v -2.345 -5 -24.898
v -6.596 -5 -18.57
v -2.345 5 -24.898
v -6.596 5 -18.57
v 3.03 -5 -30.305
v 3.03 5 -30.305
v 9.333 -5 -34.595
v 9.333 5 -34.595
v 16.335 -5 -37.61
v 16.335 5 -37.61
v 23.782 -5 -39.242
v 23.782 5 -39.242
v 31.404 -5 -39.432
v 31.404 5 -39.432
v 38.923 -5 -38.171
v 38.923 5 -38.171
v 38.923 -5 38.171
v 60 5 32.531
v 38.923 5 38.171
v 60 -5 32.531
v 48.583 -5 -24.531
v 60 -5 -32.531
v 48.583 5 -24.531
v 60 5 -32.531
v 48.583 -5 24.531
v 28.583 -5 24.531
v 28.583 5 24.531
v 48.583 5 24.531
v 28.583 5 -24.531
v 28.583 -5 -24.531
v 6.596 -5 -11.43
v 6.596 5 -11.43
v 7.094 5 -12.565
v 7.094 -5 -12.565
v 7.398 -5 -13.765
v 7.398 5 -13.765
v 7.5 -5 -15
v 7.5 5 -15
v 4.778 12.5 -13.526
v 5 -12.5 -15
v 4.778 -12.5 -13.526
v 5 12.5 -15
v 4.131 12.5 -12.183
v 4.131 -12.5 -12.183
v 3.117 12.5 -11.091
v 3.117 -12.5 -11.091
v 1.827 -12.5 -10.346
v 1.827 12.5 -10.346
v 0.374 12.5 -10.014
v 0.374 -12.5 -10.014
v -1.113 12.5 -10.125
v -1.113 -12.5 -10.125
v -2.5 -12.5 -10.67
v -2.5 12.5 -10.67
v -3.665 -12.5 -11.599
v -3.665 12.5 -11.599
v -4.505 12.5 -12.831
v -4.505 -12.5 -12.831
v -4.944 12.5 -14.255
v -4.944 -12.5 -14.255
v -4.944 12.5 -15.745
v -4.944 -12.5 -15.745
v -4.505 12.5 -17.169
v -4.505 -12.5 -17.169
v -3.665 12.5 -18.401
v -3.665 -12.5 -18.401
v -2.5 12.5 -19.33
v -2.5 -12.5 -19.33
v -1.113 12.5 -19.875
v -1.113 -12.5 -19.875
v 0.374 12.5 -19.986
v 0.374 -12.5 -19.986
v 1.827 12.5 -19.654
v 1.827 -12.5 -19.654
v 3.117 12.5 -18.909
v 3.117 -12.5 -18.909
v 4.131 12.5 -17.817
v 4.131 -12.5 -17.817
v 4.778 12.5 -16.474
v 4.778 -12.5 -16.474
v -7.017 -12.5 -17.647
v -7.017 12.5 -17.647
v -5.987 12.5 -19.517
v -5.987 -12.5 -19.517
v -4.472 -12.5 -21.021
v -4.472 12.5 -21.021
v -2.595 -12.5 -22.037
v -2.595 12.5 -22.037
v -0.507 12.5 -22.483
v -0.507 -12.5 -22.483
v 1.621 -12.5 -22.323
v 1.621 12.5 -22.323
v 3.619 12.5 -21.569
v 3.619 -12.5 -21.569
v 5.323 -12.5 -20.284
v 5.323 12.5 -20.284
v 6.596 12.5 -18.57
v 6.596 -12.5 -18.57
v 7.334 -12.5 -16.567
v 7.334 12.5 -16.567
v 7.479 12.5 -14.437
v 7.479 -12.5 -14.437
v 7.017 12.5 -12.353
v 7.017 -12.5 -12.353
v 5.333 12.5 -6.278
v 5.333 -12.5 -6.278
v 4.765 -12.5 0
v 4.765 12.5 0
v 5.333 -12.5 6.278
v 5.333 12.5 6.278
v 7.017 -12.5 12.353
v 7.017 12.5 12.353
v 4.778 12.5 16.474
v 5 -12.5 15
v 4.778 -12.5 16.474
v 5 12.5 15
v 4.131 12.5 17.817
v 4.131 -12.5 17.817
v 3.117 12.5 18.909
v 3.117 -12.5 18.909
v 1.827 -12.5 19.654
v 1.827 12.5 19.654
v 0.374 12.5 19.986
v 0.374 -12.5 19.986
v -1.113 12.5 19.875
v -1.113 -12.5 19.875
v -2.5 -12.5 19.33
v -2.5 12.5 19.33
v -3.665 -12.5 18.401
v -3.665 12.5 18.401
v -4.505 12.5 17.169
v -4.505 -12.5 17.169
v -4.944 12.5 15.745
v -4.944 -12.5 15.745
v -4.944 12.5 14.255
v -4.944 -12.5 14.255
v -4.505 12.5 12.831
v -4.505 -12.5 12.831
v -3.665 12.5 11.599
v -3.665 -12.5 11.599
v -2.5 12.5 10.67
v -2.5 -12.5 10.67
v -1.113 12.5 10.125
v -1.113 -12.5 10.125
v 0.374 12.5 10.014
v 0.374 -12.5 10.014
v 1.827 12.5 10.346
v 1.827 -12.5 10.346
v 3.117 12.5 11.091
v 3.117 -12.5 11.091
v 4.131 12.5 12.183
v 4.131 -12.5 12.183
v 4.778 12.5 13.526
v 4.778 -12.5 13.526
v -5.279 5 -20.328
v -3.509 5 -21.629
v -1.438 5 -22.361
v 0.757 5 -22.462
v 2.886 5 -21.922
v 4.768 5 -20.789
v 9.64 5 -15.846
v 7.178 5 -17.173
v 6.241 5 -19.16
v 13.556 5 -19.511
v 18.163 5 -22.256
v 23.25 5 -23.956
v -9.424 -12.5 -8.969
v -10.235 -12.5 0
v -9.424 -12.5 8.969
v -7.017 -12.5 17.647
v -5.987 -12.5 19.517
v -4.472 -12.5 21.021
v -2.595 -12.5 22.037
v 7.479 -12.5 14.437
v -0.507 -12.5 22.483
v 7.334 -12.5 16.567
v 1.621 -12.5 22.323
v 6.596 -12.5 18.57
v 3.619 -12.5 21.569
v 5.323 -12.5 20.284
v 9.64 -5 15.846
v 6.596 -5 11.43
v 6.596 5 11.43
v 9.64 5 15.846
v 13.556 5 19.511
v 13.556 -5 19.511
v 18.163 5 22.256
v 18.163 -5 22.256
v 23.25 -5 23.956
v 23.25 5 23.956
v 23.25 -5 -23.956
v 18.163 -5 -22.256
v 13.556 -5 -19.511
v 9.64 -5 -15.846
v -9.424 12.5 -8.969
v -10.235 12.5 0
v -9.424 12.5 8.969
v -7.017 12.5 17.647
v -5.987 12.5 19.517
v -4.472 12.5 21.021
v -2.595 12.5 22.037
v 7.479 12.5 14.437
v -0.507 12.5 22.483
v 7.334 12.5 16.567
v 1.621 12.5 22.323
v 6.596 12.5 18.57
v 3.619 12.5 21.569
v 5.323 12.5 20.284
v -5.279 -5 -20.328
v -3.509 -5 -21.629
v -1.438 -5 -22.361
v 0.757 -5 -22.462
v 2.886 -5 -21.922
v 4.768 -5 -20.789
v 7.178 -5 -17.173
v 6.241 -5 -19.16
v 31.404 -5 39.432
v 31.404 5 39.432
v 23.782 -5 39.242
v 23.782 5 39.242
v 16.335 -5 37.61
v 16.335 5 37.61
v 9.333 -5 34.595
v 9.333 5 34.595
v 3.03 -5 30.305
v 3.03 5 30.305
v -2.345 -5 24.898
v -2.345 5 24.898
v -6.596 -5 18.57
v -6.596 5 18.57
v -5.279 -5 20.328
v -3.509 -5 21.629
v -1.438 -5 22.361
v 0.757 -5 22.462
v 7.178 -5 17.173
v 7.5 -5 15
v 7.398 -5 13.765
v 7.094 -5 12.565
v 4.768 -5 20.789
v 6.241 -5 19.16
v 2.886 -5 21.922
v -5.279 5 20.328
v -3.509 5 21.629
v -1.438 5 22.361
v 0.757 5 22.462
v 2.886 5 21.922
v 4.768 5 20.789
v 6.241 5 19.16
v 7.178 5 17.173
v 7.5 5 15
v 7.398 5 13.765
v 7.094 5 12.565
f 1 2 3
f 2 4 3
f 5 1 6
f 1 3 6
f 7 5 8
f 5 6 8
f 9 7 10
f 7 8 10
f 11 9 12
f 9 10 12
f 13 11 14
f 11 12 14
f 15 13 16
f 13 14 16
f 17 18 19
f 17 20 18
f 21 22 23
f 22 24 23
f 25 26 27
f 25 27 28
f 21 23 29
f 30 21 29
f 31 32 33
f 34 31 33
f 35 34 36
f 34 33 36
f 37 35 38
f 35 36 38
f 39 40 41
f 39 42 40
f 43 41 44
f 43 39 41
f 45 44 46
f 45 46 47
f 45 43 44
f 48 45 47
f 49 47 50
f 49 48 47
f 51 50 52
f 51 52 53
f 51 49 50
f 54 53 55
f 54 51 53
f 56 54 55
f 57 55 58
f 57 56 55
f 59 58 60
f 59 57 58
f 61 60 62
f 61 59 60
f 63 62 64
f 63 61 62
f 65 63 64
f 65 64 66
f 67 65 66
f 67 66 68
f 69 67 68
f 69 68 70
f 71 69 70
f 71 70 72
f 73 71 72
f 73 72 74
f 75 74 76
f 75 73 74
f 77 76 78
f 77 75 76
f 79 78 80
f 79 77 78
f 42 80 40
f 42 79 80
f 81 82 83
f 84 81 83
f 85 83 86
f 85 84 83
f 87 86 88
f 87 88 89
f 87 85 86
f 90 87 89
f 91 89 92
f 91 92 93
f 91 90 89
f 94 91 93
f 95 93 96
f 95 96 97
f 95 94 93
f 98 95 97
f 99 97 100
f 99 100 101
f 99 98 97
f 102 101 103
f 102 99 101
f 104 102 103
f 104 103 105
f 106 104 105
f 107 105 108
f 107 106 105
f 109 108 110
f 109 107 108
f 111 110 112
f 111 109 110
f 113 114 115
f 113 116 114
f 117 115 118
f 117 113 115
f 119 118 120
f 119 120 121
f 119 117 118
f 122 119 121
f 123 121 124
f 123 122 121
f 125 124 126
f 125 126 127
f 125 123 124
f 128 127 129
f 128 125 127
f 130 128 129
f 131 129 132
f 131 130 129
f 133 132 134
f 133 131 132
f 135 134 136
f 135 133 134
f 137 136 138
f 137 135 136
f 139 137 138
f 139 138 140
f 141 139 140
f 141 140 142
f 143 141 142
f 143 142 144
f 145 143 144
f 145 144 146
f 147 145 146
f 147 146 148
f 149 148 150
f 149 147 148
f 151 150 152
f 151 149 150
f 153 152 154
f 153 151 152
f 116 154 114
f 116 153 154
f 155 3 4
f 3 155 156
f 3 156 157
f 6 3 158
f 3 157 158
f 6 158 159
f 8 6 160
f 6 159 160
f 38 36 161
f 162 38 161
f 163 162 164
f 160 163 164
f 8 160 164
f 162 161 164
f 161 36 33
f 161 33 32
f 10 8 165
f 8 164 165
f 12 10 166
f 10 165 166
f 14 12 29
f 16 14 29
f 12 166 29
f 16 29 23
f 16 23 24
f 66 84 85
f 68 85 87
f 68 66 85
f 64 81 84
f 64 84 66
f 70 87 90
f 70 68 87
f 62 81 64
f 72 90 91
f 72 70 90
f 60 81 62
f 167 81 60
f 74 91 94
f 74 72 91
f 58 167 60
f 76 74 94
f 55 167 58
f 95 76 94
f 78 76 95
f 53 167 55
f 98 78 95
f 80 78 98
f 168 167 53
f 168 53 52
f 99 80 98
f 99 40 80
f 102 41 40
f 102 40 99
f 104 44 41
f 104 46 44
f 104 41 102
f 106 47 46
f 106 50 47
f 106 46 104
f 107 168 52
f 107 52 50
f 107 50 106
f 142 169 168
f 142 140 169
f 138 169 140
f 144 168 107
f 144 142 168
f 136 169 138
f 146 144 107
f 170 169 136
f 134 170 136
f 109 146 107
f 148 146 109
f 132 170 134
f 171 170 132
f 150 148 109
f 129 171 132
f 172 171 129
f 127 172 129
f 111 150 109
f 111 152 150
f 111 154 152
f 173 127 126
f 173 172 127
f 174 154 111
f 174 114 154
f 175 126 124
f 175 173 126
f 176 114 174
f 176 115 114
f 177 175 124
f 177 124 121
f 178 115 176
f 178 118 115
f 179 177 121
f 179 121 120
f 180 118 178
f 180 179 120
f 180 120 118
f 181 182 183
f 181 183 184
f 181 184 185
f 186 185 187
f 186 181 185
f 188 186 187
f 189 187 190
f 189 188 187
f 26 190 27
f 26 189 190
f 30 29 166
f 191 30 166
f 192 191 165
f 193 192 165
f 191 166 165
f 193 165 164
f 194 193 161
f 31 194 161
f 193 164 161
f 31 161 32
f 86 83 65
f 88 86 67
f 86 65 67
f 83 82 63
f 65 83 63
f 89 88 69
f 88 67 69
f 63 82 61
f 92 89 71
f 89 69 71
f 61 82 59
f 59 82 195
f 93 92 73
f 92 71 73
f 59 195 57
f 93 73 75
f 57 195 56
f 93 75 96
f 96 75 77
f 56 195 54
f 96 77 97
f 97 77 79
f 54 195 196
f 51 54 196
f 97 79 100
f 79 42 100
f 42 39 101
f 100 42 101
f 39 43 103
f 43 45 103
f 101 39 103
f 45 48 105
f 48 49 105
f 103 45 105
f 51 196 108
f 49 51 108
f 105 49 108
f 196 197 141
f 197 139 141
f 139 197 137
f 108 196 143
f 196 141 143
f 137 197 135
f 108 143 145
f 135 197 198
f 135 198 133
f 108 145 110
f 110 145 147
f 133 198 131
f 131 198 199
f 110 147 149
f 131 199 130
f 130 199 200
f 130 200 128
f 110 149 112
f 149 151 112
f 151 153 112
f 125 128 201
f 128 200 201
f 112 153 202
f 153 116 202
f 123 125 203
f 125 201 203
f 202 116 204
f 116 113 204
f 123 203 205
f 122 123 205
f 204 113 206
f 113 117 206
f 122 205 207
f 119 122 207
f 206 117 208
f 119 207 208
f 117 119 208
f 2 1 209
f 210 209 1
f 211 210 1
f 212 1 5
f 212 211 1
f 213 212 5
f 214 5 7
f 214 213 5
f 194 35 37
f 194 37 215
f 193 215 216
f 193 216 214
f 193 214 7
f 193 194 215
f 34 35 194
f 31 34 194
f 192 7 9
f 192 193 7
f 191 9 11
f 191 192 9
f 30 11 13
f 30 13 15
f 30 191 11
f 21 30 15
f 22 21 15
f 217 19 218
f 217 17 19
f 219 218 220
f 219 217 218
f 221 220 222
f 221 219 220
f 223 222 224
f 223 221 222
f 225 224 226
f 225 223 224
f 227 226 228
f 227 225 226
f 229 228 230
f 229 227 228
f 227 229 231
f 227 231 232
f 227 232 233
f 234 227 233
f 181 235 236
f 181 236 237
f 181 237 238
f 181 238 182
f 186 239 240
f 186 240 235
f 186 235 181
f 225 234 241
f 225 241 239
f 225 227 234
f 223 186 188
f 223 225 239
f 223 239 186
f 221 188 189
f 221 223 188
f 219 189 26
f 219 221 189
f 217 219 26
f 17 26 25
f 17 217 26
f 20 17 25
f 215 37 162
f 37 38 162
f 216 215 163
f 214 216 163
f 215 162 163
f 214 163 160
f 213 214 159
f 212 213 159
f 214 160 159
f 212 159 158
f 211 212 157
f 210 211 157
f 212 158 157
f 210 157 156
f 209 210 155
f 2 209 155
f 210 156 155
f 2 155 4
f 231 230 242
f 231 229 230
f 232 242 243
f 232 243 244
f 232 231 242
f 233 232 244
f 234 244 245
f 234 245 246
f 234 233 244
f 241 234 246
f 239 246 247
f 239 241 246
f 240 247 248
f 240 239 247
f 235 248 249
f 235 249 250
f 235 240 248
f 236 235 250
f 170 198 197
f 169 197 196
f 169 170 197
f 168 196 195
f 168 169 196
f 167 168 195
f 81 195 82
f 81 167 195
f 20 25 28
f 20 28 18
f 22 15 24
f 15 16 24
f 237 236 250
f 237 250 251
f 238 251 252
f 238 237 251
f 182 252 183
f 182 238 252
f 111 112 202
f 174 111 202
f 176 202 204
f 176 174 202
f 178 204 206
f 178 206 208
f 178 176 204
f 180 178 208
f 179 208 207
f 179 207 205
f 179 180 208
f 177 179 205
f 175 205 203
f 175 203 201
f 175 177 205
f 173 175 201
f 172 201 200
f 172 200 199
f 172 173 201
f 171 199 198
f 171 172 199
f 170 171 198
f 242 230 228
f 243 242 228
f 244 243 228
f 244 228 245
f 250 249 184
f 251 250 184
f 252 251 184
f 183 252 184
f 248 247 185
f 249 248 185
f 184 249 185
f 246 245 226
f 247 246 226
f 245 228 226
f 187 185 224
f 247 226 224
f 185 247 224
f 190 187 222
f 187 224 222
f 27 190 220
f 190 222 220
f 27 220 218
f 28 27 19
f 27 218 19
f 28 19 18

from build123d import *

# Parameters (mm, degrees)
F0_R     = 5
F2_DEPTH = 12.5
F3_DEPTH = 5


with BuildPart() as f2:
    # F0 (on Front) → F2 (new body, symmetric)
    with BuildSketch(Plane.XZ):
        with BuildLine():
            ThreePointArc((7.017341, -12.352941), (4.764934, 0), (7.017341, 12.352941))
            ThreePointArc((7.017341, 12.352941), (2.647059, 22.017341), (-7.017341, 17.647059))
            ThreePointArc((-7.017341, 17.647059), (-10.235066, 0), (-7.017341, -17.647059))
            ThreePointArc((-7.017341, -17.647059), (2.647059, -22.017341), (7.017341, -12.352941))
        make_face()
        with Locations((0, -15)):
            Circle(F0_R, mode=Mode.SUBTRACT)
        with Locations((0, 15)):
            Circle(F0_R, mode=Mode.SUBTRACT)
    extrude(amount=F2_DEPTH, both=True)


with BuildPart() as f3:
    # F1 (on Front) → F3 (new body, symmetric)
    with BuildSketch(Plane.XZ):
        with BuildLine():
            ThreePointArc((6.595982, -11.430264), (7.270484, -13.158787), (7.5, -15))
            ThreePointArc((7.5, -15), (1.841213, -22.270484), (-6.595982, -18.569736))
            ThreePointArc((-6.595982, -18.569736), (12.762009, -36.269531), (38.922994, -38.171485))
            Line((38.922994, -38.171485), (60, -32.531142))
            Line((60, -32.531142), (48.58259, -24.531142))
            Line((48.58259, -24.531142), (28.58259, -24.531142))
            ThreePointArc((28.58259, -24.531142), (15.785677, -21.007618), (6.595982, -11.430264))
        make_face()
        with BuildLine():
            ThreePointArc((-6.595982, 18.569736), (1.841213, 22.270484), (7.5, 15))
            ThreePointArc((7.5, 15), (7.270484, 13.158787), (6.595982, 11.430264))
            ThreePointArc((6.595982, 11.430264), (15.785677, 21.007618), (28.58259, 24.531142))
            Line((28.58259, 24.531142), (48.58259, 24.531142))
            Line((48.58259, 24.531142), (60, 32.531142))
            Line((60, 32.531142), (38.922994, 38.171485))
            ThreePointArc((38.922994, 38.171485), (12.762009, 36.269531), (-6.595982, 18.569736))
        make_face()
    extrude(amount=F3_DEPTH, both=True)


solid = Compound([f2.part, f3.part])
